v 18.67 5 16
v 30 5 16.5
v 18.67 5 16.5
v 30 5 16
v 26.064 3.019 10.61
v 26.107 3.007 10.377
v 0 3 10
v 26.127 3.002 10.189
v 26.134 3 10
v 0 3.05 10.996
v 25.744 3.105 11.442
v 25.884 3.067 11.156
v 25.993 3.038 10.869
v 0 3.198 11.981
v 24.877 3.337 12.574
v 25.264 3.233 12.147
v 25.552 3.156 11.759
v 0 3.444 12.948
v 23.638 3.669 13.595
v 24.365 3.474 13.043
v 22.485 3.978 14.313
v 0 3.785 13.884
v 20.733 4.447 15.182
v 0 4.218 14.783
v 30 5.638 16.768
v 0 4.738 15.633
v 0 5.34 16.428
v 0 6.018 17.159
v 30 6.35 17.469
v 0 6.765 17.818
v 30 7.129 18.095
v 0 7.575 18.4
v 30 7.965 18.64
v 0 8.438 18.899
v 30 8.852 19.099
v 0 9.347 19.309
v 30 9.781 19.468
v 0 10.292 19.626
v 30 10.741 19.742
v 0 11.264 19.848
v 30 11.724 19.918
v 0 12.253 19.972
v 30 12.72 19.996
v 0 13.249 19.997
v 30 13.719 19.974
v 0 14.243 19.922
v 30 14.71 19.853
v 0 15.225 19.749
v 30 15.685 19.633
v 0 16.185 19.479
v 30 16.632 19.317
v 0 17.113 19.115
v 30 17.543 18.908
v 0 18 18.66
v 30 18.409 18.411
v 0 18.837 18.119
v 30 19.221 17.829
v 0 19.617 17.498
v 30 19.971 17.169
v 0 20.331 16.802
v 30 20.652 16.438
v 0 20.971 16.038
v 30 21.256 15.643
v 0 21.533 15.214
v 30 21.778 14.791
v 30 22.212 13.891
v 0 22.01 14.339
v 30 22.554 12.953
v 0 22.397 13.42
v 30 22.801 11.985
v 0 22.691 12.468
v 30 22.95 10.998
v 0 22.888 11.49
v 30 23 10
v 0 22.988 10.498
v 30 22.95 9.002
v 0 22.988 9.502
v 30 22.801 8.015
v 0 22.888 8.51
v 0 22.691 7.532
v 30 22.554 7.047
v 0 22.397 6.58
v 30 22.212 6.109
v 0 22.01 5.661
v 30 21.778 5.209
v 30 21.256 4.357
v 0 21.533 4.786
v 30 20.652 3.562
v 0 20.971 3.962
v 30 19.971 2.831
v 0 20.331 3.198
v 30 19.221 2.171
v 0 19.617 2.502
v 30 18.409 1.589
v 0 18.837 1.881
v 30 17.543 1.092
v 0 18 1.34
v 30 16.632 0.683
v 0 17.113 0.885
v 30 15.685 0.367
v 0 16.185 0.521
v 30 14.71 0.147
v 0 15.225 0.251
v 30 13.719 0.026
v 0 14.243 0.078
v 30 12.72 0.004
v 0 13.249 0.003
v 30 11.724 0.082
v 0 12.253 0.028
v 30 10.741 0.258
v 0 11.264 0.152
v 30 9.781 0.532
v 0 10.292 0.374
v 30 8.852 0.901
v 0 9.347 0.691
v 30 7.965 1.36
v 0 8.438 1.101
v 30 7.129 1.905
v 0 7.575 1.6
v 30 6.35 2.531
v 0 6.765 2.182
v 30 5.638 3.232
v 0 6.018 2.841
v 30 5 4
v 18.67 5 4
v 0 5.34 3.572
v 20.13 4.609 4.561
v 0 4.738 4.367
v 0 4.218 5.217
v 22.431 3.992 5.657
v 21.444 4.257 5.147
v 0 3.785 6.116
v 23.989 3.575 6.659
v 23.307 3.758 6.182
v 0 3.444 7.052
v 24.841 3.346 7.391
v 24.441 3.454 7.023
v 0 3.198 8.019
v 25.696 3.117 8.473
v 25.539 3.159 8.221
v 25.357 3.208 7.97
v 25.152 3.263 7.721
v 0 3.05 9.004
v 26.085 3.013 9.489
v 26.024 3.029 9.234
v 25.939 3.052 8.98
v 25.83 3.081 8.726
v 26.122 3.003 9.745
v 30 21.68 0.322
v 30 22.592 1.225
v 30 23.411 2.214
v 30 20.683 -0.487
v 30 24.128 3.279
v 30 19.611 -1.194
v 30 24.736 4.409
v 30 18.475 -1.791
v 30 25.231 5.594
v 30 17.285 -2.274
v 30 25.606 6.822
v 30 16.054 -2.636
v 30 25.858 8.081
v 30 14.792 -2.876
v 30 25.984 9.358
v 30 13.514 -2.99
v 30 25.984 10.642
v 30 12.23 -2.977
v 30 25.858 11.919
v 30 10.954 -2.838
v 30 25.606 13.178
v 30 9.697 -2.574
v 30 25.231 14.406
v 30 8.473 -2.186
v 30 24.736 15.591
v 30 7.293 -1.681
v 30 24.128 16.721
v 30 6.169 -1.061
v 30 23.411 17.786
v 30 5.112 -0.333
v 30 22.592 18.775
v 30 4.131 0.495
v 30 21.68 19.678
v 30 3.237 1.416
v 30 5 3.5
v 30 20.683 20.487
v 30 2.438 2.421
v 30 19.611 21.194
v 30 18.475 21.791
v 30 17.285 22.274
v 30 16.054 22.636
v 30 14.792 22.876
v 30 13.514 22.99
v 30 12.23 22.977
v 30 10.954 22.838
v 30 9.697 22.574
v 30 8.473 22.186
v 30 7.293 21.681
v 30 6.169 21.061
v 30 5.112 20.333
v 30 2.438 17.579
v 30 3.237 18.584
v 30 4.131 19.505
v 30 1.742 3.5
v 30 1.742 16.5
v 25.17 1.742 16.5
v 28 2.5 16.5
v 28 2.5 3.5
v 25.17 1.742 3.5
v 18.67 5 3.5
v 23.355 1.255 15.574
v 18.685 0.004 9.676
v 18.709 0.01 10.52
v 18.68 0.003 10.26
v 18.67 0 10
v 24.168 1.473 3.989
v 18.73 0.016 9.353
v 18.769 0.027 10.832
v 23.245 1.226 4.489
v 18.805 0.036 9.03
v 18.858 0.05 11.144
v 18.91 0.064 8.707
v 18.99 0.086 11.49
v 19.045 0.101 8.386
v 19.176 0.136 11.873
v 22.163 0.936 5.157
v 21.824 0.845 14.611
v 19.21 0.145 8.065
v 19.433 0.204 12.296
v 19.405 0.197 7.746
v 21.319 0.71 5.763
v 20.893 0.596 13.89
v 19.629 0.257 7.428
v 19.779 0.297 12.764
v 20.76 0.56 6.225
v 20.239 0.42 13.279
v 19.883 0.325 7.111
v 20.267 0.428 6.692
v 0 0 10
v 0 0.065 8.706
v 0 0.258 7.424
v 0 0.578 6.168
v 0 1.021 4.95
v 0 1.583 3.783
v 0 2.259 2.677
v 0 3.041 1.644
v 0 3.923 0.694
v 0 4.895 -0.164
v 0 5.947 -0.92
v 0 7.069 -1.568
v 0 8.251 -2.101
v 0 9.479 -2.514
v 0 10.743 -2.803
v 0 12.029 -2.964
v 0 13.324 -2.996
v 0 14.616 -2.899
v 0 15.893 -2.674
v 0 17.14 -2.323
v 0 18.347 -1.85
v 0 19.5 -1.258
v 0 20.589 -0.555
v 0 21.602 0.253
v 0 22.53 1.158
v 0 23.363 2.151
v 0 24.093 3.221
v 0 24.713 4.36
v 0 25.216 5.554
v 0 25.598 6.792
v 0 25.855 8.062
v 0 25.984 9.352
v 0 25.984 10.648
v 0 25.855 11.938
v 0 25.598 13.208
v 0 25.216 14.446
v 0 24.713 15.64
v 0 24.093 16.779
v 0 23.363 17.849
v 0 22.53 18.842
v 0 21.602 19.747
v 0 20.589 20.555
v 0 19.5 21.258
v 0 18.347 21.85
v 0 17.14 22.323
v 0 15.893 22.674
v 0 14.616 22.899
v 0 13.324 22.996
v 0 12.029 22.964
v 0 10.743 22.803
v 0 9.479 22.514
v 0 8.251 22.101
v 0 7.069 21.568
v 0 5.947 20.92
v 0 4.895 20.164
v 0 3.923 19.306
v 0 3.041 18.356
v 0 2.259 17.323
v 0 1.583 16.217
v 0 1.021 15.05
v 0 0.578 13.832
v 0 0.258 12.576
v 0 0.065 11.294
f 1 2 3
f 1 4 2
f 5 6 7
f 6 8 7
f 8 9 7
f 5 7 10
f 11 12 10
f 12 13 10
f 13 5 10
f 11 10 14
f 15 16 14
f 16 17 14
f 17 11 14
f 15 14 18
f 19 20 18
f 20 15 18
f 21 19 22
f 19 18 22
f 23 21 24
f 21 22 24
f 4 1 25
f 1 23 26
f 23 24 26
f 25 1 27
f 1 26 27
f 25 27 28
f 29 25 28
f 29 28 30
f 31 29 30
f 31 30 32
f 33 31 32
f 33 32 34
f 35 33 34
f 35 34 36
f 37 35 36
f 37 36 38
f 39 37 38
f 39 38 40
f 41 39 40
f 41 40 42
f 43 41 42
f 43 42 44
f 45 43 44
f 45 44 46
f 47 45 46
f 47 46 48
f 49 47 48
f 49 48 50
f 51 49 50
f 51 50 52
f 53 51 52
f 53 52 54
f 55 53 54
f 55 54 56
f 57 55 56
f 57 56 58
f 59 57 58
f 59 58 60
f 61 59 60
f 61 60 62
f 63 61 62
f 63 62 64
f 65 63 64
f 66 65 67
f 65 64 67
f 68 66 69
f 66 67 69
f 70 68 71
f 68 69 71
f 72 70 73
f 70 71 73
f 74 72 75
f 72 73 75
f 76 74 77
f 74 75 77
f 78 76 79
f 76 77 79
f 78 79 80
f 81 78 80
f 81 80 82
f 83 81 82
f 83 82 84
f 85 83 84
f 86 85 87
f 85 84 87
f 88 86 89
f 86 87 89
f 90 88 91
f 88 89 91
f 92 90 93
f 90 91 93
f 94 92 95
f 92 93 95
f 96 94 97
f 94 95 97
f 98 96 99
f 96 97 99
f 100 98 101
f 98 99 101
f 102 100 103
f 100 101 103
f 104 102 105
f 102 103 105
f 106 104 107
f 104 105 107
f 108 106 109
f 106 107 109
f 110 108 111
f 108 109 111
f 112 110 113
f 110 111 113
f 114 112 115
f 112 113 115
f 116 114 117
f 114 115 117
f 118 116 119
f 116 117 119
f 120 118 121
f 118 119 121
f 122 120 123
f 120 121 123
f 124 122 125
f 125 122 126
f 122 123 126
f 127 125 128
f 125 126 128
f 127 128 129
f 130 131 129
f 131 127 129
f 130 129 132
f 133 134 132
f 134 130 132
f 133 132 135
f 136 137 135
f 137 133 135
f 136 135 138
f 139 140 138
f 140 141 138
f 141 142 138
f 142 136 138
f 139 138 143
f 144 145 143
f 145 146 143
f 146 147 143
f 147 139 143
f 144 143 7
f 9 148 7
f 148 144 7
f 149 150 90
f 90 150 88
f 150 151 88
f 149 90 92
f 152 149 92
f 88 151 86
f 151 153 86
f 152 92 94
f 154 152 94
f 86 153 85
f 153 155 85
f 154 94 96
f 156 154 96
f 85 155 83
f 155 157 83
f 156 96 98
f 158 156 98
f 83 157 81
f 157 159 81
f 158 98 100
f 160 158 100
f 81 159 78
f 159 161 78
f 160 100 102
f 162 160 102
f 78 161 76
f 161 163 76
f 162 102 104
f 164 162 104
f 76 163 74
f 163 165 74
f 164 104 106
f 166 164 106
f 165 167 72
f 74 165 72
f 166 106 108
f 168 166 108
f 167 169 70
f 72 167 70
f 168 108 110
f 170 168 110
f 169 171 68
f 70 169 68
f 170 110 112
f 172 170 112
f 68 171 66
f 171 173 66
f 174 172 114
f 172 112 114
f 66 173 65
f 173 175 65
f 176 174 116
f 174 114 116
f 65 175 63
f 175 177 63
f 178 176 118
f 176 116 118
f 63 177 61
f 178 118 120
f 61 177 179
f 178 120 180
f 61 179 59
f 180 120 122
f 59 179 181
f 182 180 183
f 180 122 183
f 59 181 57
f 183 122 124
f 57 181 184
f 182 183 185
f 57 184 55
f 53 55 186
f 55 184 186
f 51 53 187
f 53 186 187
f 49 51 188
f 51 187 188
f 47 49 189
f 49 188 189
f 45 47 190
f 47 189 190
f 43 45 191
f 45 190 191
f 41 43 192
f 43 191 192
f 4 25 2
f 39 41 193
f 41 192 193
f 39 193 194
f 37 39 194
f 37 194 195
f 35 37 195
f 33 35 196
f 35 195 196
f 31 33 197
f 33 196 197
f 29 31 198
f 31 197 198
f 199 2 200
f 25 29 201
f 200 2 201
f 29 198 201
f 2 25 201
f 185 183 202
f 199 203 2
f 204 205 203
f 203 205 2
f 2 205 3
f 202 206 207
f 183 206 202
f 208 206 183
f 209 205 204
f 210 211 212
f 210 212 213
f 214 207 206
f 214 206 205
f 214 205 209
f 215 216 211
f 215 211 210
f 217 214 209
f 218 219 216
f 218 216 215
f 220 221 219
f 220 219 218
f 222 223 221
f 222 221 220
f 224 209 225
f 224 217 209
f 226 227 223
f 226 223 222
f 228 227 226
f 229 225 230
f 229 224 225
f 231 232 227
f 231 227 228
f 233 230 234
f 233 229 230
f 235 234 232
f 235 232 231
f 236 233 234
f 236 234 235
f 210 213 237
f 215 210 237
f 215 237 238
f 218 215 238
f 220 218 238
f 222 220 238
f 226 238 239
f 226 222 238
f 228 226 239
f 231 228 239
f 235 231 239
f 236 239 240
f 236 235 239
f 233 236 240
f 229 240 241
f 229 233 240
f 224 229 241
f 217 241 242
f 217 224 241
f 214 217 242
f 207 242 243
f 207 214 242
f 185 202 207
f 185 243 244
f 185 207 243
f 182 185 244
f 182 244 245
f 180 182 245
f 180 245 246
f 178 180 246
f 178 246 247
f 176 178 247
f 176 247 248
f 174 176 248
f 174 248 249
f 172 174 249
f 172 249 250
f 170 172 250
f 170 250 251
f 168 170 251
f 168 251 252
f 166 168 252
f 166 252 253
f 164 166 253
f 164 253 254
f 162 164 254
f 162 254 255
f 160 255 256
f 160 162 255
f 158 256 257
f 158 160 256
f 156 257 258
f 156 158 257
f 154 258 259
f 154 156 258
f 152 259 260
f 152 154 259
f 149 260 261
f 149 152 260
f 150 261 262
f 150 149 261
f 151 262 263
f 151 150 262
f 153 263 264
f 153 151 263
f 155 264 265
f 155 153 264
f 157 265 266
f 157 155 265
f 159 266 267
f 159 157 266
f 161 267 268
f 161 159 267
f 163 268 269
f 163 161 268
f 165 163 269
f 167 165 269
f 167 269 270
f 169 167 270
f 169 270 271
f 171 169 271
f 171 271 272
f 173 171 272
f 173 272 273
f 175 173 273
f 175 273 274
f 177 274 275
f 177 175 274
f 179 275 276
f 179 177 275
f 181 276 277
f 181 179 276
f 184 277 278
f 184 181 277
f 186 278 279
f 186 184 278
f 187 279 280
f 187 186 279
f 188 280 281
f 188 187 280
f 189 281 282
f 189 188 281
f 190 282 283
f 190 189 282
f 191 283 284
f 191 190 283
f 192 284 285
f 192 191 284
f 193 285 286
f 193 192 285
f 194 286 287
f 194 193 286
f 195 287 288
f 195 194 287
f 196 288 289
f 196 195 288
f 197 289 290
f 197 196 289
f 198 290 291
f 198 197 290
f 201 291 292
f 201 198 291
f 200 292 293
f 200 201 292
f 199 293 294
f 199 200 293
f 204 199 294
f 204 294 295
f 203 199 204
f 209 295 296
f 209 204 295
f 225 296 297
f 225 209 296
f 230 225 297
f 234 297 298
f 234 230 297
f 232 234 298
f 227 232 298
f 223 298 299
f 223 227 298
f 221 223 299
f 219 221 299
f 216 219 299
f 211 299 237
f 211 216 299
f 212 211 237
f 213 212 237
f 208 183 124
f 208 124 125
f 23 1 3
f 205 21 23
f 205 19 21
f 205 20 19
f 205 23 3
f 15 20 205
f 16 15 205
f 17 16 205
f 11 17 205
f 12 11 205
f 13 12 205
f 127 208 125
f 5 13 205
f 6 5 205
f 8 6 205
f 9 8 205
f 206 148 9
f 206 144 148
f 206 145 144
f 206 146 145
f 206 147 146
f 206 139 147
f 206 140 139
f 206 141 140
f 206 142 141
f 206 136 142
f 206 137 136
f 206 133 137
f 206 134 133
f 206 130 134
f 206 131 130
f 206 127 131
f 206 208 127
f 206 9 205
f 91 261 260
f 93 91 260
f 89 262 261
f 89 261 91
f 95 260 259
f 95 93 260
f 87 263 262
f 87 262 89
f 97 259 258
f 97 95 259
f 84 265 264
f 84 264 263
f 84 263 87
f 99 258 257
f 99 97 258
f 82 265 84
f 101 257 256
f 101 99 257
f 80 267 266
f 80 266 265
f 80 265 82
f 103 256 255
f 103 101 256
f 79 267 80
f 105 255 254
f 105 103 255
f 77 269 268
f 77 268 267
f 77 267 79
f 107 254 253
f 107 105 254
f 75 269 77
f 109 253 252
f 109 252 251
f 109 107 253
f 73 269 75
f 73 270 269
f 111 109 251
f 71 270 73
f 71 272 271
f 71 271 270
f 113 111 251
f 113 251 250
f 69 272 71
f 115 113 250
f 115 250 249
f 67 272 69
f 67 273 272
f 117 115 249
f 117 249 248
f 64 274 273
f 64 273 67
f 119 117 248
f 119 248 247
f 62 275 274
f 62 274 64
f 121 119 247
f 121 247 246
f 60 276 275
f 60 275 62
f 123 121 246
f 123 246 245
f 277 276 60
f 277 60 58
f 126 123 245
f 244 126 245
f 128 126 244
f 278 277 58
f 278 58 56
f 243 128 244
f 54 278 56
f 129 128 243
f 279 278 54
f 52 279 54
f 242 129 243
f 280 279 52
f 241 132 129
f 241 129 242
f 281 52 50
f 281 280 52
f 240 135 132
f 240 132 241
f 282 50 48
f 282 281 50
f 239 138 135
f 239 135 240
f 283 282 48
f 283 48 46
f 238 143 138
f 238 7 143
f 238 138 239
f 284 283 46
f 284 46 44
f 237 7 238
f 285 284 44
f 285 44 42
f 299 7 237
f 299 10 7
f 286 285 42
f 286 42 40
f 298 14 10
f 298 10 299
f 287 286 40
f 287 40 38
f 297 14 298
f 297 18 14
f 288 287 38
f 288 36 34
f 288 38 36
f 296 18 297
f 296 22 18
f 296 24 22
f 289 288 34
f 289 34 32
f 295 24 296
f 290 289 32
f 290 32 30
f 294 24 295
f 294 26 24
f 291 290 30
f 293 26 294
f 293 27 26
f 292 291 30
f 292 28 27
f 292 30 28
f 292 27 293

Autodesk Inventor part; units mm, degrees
ref_plane "YZ Plane" through (0, 0, 0) normal (1, 0, 0) x (0, 1, 0)
ref_plane "XZ Plane" through (0, 0, 0) normal (0, 1, 0) x (-1, 0, 0)
ref_plane "Work Plane1" through (0, 0, 10) normal (0, 0, 1) x (1, 0, 0)
sketch "Sketch2" plane through (0, 0, 10) normal (0, 0, 1) x (1, 0, 0)
  line L0 (0, 0) -> (30, 0)
  line L1 (30, 0) -> (30, 3)
  line L2 (30, 3) -> (0, 3)
  line L3 (0, 3) -> (0, 0)
  line L4 (30, 13) -> (0, 13)
  dimension "d11" = 30
  dimension "d12" = 3
  dimension "d13" = 10
revolve "Revolution1" add sketch "Sketch2" angle 360 about axis through (30, 13, 10) along (-1, 0, 0)
sketch "Sketch3" plane through (0, 0, 10) normal (0, 0, 1) x (1, 0, 0)
  line L0 (18.6699, 0) -> (35.6699, 0)
  line L1 (35.6699, 0) -> (35.6699, 5)
  line L2 (35.6699, 5) -> (18.6699, 5)
  line L3 (18.6699, 5) -> (28, 2.5)
  line L4 (28, 2.5) -> (18.6699, 0)
  line L5 (0, 26) -> (0, 0) projected
  line L6 (-3.0148, 0) -> (-5.3111, 0)
  dimension "d17" = 17
  dimension "d19" = 15
  dimension "d20" = 15
  dimension "d21" = 2.5
  dimension "d23" = 28
  dimension "d24" = 5
  dimension "d25" = 5.3111
  dimension "d26" = 7.6699
extrude "Extrusion2" cut sketch "Sketch3" along normal mid plane 13
equation "\"d20\" = d19"
properties part number "Whistle 1.3"
